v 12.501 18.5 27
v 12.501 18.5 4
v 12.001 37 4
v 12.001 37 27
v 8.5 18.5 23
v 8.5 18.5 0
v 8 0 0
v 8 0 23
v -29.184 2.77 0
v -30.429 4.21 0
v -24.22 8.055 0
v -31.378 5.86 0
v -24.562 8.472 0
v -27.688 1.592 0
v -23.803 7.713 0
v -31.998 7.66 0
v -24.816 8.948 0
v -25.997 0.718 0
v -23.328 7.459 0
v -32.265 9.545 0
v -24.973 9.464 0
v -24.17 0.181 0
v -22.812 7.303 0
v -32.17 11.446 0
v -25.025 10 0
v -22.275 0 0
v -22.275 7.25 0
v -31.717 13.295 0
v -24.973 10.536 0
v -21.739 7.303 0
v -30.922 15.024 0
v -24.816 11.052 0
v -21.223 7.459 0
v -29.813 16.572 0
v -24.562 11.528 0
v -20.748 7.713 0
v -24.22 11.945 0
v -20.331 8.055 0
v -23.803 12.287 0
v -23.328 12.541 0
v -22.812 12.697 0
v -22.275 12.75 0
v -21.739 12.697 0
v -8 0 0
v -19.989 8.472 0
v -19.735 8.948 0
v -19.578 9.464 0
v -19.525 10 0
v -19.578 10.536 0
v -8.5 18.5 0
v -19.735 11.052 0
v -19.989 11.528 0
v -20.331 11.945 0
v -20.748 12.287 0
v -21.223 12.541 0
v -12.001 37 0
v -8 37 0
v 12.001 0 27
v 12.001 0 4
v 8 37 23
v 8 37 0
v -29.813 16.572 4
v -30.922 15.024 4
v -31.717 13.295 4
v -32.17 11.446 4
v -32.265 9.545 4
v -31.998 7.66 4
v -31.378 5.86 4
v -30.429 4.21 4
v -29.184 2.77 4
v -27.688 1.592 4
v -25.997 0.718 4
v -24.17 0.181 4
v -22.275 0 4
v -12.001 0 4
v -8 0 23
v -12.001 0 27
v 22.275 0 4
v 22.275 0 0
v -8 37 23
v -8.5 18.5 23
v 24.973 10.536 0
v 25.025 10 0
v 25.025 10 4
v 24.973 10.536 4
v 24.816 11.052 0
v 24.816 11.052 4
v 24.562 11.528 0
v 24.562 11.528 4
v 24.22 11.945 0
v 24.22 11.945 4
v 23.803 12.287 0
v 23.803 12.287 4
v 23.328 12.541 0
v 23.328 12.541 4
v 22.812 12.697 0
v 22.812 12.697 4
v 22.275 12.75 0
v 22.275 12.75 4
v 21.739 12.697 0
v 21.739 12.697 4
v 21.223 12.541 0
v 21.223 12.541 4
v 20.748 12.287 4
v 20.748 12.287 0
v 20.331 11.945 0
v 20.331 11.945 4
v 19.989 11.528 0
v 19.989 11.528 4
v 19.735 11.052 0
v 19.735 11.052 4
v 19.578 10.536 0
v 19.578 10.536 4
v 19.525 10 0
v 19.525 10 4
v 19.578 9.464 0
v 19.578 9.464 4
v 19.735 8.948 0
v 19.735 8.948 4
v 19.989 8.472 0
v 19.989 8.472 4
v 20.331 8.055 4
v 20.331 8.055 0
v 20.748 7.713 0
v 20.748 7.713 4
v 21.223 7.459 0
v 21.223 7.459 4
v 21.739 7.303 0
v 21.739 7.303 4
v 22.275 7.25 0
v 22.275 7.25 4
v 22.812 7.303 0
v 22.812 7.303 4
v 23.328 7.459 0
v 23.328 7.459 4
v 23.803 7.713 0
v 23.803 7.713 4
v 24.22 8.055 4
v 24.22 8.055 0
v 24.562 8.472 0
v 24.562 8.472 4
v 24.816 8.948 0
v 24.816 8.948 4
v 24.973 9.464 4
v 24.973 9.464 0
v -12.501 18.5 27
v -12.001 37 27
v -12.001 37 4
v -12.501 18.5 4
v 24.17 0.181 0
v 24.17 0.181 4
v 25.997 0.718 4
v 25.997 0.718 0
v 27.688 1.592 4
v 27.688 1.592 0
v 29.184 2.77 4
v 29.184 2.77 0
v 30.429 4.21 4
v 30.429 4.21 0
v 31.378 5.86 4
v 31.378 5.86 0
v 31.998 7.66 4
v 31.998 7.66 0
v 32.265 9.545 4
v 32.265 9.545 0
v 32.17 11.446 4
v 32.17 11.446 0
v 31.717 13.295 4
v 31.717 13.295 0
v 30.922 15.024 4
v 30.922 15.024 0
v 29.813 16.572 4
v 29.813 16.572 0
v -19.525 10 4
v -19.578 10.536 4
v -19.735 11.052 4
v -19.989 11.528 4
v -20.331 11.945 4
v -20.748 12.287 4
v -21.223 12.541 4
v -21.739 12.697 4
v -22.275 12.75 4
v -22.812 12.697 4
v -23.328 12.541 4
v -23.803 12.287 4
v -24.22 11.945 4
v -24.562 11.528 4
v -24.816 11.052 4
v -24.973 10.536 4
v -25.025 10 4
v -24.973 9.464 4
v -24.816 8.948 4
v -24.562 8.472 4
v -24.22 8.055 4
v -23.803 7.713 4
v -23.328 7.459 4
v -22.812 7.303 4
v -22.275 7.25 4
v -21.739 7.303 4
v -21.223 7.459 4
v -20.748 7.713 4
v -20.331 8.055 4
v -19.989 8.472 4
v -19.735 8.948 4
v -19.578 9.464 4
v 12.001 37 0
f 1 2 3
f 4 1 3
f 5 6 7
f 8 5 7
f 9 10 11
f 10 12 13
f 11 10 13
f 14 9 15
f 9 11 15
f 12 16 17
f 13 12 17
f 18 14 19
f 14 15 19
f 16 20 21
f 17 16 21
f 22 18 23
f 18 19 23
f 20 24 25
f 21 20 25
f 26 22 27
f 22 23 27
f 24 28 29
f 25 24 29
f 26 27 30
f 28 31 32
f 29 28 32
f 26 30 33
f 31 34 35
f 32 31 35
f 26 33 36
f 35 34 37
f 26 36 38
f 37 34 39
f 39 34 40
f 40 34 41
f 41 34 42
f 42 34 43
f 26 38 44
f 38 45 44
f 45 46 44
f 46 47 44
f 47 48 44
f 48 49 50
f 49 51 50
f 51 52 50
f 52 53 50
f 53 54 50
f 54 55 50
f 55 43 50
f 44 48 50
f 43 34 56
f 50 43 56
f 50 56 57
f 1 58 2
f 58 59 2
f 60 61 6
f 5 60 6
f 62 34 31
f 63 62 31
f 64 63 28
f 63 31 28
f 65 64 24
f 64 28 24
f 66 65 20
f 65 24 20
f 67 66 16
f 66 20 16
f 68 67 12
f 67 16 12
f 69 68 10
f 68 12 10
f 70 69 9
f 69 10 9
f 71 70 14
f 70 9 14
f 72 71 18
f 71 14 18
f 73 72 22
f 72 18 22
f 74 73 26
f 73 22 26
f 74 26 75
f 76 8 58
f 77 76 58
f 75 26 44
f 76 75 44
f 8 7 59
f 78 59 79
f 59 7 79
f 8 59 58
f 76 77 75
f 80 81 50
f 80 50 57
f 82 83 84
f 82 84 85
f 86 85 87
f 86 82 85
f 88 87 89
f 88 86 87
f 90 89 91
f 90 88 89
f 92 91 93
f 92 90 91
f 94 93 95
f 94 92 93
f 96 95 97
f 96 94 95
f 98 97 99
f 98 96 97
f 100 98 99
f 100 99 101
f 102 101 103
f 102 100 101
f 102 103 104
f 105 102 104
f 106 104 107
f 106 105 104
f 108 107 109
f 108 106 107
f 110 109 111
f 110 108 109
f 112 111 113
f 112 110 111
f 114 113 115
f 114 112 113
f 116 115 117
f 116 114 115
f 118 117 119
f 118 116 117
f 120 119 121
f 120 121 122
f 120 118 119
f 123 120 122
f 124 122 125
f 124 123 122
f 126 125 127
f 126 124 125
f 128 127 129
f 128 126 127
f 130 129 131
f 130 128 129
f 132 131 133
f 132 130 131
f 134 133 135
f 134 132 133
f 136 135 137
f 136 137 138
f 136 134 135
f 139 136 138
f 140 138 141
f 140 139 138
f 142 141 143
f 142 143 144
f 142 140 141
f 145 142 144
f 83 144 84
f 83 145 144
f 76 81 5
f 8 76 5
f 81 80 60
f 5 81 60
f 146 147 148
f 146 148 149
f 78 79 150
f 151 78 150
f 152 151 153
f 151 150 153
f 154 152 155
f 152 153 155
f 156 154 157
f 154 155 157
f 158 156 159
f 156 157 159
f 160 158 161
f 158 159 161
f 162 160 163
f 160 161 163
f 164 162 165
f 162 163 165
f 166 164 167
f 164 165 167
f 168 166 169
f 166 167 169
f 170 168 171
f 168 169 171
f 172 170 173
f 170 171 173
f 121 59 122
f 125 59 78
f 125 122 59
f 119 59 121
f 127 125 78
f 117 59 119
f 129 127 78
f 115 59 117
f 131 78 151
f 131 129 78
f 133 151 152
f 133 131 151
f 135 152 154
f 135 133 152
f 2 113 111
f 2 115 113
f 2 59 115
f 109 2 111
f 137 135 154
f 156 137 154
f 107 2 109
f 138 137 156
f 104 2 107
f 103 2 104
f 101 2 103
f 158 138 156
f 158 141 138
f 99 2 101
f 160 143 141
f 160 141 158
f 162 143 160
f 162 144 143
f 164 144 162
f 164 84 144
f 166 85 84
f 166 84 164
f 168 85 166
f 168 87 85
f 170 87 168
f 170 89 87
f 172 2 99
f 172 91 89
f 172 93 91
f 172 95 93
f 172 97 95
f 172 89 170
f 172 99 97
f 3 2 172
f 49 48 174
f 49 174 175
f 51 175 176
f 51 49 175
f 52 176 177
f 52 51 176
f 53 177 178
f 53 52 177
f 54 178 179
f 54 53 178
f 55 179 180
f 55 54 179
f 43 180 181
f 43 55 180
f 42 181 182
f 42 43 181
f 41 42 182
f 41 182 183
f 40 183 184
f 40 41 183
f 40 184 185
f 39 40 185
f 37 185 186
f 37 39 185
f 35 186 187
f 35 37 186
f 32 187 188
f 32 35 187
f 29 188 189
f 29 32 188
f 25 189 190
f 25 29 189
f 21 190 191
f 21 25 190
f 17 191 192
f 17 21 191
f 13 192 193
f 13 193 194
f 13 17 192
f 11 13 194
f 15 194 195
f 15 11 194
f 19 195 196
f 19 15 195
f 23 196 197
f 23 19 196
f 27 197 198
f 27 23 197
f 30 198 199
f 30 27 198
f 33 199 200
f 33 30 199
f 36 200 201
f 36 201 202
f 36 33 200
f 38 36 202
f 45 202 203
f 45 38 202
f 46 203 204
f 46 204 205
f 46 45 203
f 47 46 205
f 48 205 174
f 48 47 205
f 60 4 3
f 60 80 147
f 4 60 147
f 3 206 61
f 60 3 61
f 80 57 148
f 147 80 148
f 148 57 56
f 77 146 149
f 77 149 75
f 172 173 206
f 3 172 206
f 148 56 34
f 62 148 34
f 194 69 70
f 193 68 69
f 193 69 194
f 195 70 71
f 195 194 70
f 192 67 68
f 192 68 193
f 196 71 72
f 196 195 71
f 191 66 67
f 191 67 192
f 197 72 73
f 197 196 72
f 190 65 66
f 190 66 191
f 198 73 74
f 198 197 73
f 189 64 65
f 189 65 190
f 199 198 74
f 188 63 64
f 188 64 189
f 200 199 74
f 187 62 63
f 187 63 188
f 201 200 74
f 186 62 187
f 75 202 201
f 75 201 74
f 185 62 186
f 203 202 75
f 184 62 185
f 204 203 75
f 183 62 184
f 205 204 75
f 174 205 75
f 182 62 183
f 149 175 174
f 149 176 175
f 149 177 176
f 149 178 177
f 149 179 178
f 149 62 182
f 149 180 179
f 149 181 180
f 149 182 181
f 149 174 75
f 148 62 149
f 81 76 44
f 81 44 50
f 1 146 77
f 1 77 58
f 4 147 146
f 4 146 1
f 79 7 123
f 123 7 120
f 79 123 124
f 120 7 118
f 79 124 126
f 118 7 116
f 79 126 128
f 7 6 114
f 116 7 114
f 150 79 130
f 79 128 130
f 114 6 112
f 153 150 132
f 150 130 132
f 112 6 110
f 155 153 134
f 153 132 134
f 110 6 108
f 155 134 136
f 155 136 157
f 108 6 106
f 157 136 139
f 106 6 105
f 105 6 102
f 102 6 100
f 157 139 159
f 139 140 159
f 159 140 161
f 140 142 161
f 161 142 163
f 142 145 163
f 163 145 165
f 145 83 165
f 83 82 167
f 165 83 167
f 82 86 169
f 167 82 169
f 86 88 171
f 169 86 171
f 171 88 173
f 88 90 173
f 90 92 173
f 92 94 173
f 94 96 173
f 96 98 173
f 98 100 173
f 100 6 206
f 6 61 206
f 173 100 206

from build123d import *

# Parameters (mm, degrees)
F0_R     = 2.75
F1_DEPTH = 4
F2_DEPTH = 23
F3_START = 23
F3_DEPTH = 4


with BuildPart() as f1:
    # F0 (on Top) → F1 (new body)
    with BuildSketch(Plane.XY):
        with BuildLine():
            Line((12.5014606537, 18.5), (12.0014606537, 0))
            Line((12.0014606537, 0), (22.2753825582, 0))
            ThreePointArc((22.2753825582, 0), (31.378069952, 5.859820993), (29.8127336093, 16.571783558))
            Line((29.8127336093, 16.571783558), (12.0014606537, 37))
            Line((12.0014606537, 37), (12.5014606537, 18.5))
        make_face()
        with Locations((22.2753825582, 10)):
            Circle(F0_R, mode=Mode.SUBTRACT)
    extrude(amount=F1_DEPTH)

    # F0 (on Top) → F2, piece 2 (join)
    with BuildSketch(Plane.XY):
        Polygon((8.5, 18.5), (8, 0), (12.0014606537, 0), (12.5014606537, 18.5), (12.0014606537, 37), (8, 37), align=None)
    extrude(amount=F2_DEPTH)



with BuildPart() as f1b:
    # F0 (on Top) → F1, piece 2 (new body)
    with BuildSketch(Plane.XY):
        with BuildLine():
            ThreePointArc((-29.8127336093, 16.571783558), (-31.378069952, 5.859820993), (-22.2753825582, 0))
            Line((-22.2753825582, 0), (-12.0014606537, 0))
            Line((-12.0014606537, 0), (-12.5014606537, 18.5))
            Line((-12.5014606537, 18.5), (-12.0014606537, 37))
            Line((-12.0014606537, 37), (-29.8127336093, 16.571783558))
        make_face()
        with Locations((-22.2753825582, 10)):
            Circle(F0_R, mode=Mode.SUBTRACT)
    extrude(amount=F1_DEPTH)

    # F0 (on Top) → F2 (join)
    with BuildSketch(Plane.XY):
        Polygon((-12.5014606537, 18.5), (-12.0014606537, 0), (-8, 0), (-8.5, 18.5), (-8, 37), (-12.0014606537, 37), align=None)
    extrude(amount=F2_DEPTH)


with BuildPart() as f1_1:
    add(f1.part)

    add(f1b.part)  # F3 merges F1b
    # F0 (on Top) → F3 (join)
    with BuildSketch(Plane.XY.offset(F3_START)):
        Polygon((-8.5, 18.5), (-8, 0), (8, 0), (8.5, 18.5), (8, 37), (-8, 37), align=None)
        Polygon((-12.5014606537, 18.5), (-12.0014606537, 0), (-8, 0), (-8.5, 18.5), (-8, 37), (-12.0014606537, 37), align=None)
        Polygon((8.5, 18.5), (8, 0), (12.0014606537, 0), (12.5014606537, 18.5), (12.0014606537, 37), (8, 37), align=None)
    extrude(amount=F3_DEPTH)


solid = f1_1.part
